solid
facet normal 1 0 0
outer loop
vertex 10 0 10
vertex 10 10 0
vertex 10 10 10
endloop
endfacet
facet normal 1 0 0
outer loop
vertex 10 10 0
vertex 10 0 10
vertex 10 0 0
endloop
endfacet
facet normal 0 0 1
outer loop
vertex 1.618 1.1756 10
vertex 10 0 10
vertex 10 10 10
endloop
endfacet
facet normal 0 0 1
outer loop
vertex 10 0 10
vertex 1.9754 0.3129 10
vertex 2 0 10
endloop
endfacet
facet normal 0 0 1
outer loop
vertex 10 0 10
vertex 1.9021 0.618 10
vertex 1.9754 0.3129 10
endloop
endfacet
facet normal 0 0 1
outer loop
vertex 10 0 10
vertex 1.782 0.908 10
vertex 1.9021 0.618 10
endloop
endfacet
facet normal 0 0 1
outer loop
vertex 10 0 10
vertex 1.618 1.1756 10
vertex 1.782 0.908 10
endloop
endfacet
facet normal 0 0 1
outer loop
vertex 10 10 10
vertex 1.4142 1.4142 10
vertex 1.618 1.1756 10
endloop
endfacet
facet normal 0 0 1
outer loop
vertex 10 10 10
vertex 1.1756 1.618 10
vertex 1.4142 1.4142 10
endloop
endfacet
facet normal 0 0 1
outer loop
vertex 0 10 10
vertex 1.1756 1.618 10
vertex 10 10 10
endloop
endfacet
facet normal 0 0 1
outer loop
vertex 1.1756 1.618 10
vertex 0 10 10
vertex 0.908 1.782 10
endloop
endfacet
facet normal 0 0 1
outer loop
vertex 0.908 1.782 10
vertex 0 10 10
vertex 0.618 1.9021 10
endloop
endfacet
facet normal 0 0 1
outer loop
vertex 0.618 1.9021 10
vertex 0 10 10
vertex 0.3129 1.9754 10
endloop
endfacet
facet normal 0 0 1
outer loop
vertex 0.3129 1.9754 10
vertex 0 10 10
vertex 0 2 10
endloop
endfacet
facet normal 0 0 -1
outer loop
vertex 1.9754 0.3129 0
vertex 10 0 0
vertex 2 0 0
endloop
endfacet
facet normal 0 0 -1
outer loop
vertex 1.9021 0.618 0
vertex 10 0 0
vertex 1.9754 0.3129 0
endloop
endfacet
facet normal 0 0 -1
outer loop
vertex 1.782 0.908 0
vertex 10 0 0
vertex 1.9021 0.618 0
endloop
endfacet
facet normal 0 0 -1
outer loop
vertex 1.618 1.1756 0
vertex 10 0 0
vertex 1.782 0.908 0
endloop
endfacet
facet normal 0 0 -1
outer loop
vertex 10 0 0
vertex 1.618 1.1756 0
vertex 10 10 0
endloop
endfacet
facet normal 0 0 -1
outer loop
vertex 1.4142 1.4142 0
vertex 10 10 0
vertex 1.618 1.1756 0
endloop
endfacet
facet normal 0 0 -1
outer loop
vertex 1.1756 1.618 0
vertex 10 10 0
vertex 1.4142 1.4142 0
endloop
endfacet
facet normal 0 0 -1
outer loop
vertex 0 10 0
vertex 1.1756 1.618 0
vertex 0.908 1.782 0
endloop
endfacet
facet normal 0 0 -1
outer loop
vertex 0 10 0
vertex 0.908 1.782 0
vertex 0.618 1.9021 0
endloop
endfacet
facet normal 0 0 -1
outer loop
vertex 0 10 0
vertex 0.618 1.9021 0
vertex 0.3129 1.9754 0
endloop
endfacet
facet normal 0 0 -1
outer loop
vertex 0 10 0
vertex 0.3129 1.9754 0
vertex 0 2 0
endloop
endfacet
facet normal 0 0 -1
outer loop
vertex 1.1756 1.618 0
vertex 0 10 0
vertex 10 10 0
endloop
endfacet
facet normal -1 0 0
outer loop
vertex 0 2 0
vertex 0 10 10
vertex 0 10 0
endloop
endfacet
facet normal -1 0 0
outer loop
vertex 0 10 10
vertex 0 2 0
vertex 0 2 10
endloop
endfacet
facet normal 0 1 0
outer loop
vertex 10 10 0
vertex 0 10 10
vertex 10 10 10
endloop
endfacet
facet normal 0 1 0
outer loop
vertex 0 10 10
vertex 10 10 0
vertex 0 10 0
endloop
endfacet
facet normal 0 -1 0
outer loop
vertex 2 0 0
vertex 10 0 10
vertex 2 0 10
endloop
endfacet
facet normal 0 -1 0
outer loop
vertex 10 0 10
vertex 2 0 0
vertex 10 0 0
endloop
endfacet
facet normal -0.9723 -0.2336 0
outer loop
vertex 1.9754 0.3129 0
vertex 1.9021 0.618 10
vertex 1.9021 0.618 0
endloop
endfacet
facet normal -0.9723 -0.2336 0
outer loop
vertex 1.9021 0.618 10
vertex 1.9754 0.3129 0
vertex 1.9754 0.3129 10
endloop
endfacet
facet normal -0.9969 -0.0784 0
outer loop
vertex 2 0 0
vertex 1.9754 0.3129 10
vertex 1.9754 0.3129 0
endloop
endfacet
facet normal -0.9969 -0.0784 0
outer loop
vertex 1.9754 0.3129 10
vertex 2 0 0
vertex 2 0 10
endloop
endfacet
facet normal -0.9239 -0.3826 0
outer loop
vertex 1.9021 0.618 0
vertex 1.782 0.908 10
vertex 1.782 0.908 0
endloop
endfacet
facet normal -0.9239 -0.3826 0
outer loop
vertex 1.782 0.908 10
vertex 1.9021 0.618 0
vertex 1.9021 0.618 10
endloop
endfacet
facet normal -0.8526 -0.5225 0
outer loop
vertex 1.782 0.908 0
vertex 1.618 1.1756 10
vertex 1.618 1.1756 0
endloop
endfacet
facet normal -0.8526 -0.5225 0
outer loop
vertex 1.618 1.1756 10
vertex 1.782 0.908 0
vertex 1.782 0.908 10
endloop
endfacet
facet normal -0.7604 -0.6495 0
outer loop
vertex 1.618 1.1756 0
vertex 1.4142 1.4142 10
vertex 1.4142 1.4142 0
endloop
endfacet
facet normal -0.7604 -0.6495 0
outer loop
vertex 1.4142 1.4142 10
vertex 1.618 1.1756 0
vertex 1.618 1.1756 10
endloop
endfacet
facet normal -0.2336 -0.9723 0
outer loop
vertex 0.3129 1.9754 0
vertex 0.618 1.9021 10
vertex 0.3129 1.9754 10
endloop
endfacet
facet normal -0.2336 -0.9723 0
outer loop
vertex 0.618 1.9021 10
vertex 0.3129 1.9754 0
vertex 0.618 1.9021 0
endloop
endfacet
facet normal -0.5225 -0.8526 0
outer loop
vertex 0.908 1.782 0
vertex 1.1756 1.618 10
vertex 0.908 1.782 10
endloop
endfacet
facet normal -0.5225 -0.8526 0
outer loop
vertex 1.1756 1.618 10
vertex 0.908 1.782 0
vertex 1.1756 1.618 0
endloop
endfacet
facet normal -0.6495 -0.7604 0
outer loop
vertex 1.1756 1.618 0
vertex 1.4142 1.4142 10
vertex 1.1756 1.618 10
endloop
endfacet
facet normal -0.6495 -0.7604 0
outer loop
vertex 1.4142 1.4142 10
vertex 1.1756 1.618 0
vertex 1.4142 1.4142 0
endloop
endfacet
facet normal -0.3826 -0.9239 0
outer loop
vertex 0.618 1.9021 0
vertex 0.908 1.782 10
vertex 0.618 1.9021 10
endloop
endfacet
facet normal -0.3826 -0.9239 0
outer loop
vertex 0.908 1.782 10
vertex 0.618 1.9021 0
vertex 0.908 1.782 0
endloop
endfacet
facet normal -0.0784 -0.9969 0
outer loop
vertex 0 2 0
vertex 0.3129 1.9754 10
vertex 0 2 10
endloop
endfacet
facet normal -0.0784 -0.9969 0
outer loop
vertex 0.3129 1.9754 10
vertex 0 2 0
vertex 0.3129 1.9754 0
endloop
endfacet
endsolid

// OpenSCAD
//Author: 
//Date: 
//Description: Combing shapes with booleans differences

$fn = 40; 

//How to do a difference
difference() {
cube([10, 10, 10]);
cylinder(h=10,r=2);
}

//1. Take two holes out of a sphere, they can be anywhere as long as they are not overlapping and are fully cutting through the sphere

//2. Take two holes out of a cube, one in the middle and one touching the edge

//3. Make a box without a lid

//4. Make a cup

//5. Make a quarter slice of pizza (a quarter of a cylinder)

//Bonus: Parameterize (use variables instead of numbers) your cup or box
